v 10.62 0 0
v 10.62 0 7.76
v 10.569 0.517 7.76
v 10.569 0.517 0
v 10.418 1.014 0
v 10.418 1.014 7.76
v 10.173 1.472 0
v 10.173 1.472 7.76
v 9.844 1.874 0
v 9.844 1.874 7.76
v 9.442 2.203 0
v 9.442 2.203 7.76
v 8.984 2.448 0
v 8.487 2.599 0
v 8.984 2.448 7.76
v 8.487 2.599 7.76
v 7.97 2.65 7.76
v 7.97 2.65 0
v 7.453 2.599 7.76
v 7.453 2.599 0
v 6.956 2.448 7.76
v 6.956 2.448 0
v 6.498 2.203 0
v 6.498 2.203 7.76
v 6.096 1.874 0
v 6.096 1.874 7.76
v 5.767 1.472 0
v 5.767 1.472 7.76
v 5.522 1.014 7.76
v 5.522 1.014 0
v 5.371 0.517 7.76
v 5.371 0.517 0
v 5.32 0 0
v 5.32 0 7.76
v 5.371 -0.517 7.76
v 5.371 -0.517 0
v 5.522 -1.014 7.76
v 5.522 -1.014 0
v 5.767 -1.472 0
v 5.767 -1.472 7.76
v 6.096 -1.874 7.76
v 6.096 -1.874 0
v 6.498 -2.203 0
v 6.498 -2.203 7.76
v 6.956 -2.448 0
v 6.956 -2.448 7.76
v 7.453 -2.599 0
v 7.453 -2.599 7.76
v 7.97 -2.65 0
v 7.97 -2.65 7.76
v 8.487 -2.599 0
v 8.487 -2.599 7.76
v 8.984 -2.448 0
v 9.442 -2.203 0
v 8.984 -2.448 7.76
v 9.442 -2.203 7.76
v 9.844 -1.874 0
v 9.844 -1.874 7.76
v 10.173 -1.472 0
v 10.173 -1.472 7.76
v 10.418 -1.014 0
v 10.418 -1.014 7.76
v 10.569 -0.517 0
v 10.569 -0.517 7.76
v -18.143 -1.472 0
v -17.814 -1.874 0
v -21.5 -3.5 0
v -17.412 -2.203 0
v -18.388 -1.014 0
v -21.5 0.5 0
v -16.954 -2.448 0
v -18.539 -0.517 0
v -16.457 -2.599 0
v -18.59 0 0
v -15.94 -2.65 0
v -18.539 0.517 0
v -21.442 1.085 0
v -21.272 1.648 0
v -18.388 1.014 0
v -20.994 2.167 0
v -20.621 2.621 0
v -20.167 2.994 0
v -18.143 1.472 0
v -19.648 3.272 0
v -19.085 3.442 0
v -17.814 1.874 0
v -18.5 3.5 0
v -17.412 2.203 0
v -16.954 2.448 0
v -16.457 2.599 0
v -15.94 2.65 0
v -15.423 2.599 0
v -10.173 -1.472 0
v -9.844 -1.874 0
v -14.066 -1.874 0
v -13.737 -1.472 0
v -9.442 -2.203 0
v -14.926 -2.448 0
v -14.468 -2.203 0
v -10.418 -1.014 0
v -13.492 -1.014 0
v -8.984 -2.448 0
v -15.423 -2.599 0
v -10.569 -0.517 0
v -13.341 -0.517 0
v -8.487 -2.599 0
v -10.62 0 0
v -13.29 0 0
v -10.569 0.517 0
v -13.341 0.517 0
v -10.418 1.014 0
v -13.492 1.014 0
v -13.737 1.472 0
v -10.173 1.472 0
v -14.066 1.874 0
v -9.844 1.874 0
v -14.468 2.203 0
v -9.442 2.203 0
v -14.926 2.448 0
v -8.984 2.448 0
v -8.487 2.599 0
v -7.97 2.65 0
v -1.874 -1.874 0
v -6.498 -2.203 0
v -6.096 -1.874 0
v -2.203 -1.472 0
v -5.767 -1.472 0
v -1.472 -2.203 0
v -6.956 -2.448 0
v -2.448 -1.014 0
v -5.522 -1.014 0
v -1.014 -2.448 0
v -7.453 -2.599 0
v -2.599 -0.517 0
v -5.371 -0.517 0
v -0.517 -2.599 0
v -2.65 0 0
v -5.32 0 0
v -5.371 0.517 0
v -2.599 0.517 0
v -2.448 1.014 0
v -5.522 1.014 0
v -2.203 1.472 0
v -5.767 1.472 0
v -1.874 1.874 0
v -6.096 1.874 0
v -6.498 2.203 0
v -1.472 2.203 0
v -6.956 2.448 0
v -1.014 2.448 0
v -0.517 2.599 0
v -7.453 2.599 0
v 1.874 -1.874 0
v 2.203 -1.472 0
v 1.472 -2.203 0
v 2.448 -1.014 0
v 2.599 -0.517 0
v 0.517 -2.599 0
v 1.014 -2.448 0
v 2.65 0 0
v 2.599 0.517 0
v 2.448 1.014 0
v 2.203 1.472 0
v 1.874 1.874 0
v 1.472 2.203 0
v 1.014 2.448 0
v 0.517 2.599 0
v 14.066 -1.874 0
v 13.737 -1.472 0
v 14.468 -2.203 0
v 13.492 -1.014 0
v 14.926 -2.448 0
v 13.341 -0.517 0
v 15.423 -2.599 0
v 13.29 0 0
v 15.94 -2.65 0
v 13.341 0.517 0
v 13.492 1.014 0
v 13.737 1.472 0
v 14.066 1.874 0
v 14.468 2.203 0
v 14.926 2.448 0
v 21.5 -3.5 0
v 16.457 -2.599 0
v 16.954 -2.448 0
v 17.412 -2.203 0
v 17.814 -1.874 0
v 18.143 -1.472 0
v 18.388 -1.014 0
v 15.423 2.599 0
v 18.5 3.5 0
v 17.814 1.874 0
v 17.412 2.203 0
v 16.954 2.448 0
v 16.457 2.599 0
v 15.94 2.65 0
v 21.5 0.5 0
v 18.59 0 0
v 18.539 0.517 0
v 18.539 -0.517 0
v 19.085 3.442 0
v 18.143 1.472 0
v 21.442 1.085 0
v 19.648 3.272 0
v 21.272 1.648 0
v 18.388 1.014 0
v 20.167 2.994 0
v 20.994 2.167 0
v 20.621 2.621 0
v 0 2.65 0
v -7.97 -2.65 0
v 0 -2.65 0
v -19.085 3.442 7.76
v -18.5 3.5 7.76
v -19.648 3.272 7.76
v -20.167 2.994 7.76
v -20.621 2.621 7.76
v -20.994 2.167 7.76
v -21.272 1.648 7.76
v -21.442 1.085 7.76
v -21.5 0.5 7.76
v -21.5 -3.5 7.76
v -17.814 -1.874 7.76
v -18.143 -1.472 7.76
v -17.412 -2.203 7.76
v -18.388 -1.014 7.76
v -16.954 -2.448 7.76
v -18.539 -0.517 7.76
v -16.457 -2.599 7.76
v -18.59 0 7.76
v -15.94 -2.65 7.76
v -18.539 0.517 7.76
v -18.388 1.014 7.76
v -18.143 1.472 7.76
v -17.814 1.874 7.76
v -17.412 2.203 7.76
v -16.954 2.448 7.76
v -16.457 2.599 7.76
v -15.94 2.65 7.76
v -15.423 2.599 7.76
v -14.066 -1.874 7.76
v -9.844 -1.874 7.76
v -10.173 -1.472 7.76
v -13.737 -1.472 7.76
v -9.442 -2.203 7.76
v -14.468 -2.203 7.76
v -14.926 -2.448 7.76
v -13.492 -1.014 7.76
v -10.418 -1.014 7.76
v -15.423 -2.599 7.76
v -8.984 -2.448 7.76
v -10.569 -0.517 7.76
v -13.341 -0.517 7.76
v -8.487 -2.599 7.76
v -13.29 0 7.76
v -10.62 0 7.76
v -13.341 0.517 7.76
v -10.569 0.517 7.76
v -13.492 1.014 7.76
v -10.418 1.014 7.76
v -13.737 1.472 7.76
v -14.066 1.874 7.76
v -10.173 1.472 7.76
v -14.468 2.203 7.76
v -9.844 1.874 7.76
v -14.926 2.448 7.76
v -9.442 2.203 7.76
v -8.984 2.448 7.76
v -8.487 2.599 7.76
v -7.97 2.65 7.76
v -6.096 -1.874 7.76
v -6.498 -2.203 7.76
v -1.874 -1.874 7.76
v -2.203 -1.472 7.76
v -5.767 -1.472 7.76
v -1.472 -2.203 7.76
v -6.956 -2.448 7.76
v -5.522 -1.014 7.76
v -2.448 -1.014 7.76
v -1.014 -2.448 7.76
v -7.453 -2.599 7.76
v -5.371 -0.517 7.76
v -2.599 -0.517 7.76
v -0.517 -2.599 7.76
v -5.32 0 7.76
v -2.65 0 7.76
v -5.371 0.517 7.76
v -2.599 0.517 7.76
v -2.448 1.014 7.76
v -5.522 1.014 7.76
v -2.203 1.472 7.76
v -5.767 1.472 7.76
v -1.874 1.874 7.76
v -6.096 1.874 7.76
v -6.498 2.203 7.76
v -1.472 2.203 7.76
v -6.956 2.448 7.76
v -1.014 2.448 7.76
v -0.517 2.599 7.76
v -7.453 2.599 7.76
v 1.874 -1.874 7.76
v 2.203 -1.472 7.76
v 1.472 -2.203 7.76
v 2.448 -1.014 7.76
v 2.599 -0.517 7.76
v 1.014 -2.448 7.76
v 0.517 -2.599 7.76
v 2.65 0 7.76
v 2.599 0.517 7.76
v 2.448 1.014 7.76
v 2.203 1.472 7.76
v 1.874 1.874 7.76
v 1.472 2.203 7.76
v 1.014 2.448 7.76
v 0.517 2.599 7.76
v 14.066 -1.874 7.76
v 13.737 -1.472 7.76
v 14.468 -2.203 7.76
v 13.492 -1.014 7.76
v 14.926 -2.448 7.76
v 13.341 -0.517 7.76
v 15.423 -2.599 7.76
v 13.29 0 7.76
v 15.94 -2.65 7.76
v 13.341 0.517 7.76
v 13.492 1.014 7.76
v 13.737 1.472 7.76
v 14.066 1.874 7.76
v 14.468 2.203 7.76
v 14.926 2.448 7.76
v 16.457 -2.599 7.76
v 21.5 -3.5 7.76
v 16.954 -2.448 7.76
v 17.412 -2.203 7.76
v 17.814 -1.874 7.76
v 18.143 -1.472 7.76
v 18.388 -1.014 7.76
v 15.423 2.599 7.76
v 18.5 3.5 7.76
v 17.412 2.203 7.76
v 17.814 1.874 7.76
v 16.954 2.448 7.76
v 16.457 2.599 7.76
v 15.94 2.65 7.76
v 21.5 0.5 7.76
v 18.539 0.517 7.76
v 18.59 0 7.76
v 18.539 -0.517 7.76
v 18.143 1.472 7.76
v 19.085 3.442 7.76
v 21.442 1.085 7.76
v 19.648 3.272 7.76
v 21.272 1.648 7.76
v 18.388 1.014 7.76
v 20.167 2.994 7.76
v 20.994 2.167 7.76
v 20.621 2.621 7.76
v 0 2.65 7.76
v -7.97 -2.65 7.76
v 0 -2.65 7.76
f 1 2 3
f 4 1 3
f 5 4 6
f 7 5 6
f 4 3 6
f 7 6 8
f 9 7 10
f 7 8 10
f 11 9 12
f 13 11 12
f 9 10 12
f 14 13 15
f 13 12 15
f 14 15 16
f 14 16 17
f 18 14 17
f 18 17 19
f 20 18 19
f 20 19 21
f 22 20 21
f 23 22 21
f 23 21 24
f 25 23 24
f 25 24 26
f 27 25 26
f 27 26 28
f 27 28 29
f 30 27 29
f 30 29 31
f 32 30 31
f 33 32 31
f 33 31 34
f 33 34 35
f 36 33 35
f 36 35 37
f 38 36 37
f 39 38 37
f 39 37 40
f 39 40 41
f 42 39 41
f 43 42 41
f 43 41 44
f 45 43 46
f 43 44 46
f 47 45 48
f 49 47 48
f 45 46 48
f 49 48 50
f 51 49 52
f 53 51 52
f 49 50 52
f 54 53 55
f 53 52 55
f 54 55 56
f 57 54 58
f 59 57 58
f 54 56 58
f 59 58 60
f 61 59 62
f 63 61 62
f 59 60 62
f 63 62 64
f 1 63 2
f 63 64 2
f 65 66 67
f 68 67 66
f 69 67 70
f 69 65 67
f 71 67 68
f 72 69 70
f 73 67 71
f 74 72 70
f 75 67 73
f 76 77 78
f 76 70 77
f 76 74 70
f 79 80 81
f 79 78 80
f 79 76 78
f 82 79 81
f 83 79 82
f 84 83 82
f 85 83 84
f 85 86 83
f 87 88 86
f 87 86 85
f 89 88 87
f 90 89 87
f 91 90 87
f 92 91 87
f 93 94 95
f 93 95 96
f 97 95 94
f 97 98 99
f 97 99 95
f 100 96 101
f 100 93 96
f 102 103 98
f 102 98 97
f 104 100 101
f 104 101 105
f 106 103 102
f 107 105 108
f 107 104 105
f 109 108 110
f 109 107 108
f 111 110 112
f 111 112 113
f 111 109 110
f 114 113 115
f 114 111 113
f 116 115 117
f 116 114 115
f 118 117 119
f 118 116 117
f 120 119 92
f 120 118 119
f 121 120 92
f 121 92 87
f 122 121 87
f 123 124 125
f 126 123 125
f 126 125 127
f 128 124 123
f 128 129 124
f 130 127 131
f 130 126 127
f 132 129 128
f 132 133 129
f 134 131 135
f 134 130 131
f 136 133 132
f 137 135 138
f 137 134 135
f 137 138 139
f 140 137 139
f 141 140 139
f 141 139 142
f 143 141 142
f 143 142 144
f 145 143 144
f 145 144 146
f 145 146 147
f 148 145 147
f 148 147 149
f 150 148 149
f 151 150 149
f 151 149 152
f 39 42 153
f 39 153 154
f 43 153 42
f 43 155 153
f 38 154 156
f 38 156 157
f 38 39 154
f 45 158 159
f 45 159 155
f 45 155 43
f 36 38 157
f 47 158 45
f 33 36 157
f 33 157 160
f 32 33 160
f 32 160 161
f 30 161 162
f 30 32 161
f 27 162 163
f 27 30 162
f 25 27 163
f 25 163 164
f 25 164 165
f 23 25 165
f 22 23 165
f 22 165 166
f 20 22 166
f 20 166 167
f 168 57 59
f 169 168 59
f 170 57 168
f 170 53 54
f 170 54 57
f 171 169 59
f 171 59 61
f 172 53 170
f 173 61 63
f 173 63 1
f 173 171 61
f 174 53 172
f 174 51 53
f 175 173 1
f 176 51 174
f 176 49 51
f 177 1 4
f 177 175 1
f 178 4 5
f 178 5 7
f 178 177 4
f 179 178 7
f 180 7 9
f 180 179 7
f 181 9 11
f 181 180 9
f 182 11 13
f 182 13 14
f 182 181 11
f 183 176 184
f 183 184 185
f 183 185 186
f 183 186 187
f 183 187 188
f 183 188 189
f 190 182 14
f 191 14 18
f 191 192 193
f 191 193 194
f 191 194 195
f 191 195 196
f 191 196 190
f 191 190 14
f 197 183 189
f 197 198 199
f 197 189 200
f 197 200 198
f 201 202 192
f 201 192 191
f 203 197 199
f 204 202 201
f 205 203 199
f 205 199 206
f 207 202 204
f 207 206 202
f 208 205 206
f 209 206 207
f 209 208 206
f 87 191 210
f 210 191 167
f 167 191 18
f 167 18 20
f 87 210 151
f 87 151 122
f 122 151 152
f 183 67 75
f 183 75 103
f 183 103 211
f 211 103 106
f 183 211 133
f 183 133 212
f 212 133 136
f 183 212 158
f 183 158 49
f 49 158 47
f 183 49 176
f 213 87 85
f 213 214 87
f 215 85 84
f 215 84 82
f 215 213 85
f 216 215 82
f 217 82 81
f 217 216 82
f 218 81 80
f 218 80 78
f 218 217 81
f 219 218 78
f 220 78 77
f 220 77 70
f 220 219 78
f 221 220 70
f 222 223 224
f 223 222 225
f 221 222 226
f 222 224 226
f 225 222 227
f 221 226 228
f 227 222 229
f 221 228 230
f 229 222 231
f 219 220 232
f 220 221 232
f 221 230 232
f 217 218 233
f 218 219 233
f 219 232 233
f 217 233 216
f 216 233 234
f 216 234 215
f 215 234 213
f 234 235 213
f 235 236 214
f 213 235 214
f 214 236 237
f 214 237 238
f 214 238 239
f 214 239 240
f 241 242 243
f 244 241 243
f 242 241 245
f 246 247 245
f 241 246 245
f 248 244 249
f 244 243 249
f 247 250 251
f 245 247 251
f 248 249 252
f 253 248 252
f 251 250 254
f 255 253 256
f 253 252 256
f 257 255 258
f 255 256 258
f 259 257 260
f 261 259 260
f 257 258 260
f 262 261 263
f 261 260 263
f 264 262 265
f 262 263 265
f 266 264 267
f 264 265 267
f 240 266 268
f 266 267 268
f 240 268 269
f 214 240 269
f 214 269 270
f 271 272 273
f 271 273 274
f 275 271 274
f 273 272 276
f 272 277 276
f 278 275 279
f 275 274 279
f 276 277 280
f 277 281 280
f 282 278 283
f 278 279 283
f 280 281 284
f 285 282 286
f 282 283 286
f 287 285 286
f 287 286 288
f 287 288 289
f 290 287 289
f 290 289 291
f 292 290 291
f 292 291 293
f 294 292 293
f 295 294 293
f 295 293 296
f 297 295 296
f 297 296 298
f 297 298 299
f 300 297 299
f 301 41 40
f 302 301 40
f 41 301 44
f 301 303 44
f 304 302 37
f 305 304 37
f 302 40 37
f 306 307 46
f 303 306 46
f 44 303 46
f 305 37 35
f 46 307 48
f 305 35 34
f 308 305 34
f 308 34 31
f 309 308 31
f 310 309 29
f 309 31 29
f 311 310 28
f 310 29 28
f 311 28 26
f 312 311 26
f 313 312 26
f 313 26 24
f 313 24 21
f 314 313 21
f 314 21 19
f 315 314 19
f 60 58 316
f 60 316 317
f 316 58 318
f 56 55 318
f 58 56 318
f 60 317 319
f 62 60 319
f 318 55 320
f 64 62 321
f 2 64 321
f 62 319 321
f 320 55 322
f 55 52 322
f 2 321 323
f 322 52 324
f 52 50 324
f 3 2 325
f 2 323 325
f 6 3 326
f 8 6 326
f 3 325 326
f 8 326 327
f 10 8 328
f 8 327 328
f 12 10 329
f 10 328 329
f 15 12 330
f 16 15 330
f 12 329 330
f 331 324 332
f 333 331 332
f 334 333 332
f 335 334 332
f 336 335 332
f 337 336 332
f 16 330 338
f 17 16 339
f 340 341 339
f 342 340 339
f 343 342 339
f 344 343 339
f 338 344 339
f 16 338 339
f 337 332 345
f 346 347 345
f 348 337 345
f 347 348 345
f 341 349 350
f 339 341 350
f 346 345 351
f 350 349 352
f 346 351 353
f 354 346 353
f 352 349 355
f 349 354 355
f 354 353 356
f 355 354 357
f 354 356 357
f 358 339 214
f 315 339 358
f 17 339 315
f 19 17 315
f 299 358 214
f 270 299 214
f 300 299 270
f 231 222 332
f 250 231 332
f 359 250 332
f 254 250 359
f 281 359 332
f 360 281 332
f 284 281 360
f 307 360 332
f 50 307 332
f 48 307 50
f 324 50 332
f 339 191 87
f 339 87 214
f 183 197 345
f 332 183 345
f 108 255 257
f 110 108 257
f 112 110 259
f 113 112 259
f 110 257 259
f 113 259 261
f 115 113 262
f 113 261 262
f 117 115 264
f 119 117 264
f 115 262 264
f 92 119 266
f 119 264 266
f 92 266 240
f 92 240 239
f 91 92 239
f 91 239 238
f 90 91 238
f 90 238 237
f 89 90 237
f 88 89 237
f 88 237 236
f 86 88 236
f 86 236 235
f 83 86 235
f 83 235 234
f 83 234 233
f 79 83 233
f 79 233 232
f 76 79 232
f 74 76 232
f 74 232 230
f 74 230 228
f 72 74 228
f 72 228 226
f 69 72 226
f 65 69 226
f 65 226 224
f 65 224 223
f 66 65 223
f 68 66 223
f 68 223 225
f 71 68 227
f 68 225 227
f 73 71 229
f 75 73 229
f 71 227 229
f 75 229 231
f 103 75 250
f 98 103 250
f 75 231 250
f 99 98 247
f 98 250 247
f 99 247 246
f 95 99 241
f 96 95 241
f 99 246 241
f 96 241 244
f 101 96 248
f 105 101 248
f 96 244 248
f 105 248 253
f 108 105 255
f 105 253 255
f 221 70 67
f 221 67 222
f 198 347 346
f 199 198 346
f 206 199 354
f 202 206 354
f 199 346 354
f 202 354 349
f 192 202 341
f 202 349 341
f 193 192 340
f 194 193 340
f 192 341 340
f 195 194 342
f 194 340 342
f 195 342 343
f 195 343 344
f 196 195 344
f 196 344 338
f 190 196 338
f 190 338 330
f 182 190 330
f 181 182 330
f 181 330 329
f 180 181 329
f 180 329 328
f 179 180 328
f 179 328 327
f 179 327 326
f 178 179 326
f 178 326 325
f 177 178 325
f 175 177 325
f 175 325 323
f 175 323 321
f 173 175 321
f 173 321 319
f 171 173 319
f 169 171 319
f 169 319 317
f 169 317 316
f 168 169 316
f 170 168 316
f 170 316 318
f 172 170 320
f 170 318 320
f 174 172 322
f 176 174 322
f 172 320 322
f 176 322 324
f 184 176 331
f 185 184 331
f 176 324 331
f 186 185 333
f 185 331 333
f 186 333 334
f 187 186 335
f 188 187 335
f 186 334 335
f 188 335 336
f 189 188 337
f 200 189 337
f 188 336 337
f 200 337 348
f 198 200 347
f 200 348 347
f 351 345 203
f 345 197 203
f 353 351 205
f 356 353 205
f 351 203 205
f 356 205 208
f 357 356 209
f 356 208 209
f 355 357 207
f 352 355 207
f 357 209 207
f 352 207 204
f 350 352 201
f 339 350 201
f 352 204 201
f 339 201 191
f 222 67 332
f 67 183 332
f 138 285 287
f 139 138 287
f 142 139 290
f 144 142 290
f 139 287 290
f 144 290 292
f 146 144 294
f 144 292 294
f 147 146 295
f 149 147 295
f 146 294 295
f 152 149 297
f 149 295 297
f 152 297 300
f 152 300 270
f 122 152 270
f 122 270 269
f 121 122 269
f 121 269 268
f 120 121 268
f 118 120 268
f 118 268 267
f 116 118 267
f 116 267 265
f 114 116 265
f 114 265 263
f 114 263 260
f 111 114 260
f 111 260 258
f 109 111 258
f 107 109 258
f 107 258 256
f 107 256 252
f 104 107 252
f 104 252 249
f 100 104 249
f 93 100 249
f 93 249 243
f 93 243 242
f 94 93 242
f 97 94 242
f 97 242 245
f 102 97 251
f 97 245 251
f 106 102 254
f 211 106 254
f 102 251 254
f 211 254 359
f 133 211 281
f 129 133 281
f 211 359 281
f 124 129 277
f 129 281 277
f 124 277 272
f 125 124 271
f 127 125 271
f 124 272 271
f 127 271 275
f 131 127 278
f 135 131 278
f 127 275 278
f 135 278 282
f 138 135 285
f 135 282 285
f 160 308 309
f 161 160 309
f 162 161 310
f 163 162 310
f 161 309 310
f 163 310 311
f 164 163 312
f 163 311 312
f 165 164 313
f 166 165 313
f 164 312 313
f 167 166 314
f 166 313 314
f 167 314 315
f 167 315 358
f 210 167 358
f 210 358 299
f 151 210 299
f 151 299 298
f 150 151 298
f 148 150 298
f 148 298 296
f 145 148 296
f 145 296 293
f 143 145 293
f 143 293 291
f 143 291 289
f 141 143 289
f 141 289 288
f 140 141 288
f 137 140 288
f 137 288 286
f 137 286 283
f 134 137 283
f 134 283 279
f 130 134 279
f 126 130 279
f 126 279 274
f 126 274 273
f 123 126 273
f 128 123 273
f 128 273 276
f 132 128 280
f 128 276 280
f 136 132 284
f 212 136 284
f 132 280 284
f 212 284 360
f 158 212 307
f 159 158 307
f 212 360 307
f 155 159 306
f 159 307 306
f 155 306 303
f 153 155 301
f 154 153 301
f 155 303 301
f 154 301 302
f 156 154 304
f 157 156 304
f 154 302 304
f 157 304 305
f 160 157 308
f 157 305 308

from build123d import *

# Parameters (mm, degrees)
SKETCH1_W           = 30
SKETCH1_H           = 6
BOSS_EXTRUDE1_DEPTH = 7.76
SKETCH2_R           = 2.65
CUT_EXTRUDE1_DEPTH  = 8
SKETCH3_W           = 7.76
SKETCH3_H           = 6
BOSS_EXTRUDE2_DEPTH = 6
SKETCH4_W           = 7.76
SKETCH4_H           = 6
BOSS_EXTRUDE3_DEPTH = 6
SKETCH5_R           = 2.65
CUT_EXTRUDE2_DEPTH  = 8
SKETCH6_W           = 42
SKETCH6_H           = 7.76
BOSS_EXTRUDE4_DEPTH = 0.5
SKETCH7_W           = 7.76
SKETCH7_H           = 6.5
BOSS_EXTRUDE5_DEPTH = 0.5
SKETCH8_W           = 42.5
SKETCH8_H           = 7.76
BOSS_EXTRUDE6_DEPTH = 0.5
SKETCH9_W           = 7.76
SKETCH9_H           = 7
BOSS_EXTRUDE7_DEPTH = 0.5
FILLET1_R           = 3


with BuildPart() as part:
    # Sketch1 → Boss-Extrude1 (new body)
    with BuildSketch(Plane.XY):
        Rectangle(SKETCH1_W, SKETCH1_H)
    extrude(amount=BOSS_EXTRUDE1_DEPTH)

    # Sketch2 → Cut-Extrude1 (cut)
    with BuildSketch(Plane.XY.offset(7.76)):
        Circle(SKETCH2_R)
        with Locations((7.97, 0)):
            Circle(SKETCH2_R)
        with Locations((-7.97, 0)):
            Circle(SKETCH2_R)
    extrude(amount=-CUT_EXTRUDE1_DEPTH, mode=Mode.SUBTRACT)

    # Sketch3 → Boss-Extrude2 (add)
    with BuildSketch(Plane.ZY.offset(15)):
        with Locations((3.88, 0)):
            Rectangle(SKETCH3_W, SKETCH3_H)
    extrude(amount=BOSS_EXTRUDE2_DEPTH)

    # Sketch4 → Boss-Extrude3 (add)
    with BuildSketch(Plane(origin=(15, 0, 0), x_dir=(0, 0, -1), z_dir=(1, 0, 0))):
        with Locations((-3.88, 0)):
            Rectangle(SKETCH4_W, SKETCH4_H)
    extrude(amount=BOSS_EXTRUDE3_DEPTH)

    # Sketch5 → Cut-Extrude2 (cut)
    with BuildSketch(Plane.XY.offset(7.76)):
        with Locations((-15.94, 0)):
            Circle(SKETCH5_R)
        with Locations((15.94, 0)):
            Circle(SKETCH5_R)
    extrude(amount=-CUT_EXTRUDE2_DEPTH, mode=Mode.SUBTRACT)

    # Sketch6 → Boss-Extrude4 (add)
    with BuildSketch(Plane(origin=(0, 3, 0), x_dir=(1, 0, 0), z_dir=(0, 1, 0))):
        with Locations((0, -3.88)):
            Rectangle(SKETCH6_W, SKETCH6_H)
    extrude(amount=BOSS_EXTRUDE4_DEPTH)

    # Sketch7 → Boss-Extrude5 (add)
    with BuildSketch(Plane(origin=(21, 0, 0), x_dir=(0, 0, -1), z_dir=(1, 0, 0))):
        with Locations((-3.88, 0.25)):
            Rectangle(SKETCH7_W, SKETCH7_H)
    extrude(amount=BOSS_EXTRUDE5_DEPTH)

    # Sketch8 → Boss-Extrude6 (add)
    with BuildSketch(Plane.XZ.offset(3)):
        with Locations((0.25, 3.88)):
            Rectangle(SKETCH8_W, SKETCH8_H)
    extrude(amount=BOSS_EXTRUDE6_DEPTH)

    # Sketch9 → Boss-Extrude7 (add)
    with BuildSketch(Plane.ZY.offset(21)):
        with Locations((3.88, 0)):
            Rectangle(SKETCH9_W, SKETCH9_H)
    extrude(amount=BOSS_EXTRUDE7_DEPTH)

    # Fillet1
    fillet1_edges = [part.edges().sort_by_distance(p)[0] for p in [
        (-21.5, 3.5, 3.88),
        (21.5, 3.5, 3.88),
    ]]
    fillet(fillet1_edges, radius=FILLET1_R)


solid = part.part
